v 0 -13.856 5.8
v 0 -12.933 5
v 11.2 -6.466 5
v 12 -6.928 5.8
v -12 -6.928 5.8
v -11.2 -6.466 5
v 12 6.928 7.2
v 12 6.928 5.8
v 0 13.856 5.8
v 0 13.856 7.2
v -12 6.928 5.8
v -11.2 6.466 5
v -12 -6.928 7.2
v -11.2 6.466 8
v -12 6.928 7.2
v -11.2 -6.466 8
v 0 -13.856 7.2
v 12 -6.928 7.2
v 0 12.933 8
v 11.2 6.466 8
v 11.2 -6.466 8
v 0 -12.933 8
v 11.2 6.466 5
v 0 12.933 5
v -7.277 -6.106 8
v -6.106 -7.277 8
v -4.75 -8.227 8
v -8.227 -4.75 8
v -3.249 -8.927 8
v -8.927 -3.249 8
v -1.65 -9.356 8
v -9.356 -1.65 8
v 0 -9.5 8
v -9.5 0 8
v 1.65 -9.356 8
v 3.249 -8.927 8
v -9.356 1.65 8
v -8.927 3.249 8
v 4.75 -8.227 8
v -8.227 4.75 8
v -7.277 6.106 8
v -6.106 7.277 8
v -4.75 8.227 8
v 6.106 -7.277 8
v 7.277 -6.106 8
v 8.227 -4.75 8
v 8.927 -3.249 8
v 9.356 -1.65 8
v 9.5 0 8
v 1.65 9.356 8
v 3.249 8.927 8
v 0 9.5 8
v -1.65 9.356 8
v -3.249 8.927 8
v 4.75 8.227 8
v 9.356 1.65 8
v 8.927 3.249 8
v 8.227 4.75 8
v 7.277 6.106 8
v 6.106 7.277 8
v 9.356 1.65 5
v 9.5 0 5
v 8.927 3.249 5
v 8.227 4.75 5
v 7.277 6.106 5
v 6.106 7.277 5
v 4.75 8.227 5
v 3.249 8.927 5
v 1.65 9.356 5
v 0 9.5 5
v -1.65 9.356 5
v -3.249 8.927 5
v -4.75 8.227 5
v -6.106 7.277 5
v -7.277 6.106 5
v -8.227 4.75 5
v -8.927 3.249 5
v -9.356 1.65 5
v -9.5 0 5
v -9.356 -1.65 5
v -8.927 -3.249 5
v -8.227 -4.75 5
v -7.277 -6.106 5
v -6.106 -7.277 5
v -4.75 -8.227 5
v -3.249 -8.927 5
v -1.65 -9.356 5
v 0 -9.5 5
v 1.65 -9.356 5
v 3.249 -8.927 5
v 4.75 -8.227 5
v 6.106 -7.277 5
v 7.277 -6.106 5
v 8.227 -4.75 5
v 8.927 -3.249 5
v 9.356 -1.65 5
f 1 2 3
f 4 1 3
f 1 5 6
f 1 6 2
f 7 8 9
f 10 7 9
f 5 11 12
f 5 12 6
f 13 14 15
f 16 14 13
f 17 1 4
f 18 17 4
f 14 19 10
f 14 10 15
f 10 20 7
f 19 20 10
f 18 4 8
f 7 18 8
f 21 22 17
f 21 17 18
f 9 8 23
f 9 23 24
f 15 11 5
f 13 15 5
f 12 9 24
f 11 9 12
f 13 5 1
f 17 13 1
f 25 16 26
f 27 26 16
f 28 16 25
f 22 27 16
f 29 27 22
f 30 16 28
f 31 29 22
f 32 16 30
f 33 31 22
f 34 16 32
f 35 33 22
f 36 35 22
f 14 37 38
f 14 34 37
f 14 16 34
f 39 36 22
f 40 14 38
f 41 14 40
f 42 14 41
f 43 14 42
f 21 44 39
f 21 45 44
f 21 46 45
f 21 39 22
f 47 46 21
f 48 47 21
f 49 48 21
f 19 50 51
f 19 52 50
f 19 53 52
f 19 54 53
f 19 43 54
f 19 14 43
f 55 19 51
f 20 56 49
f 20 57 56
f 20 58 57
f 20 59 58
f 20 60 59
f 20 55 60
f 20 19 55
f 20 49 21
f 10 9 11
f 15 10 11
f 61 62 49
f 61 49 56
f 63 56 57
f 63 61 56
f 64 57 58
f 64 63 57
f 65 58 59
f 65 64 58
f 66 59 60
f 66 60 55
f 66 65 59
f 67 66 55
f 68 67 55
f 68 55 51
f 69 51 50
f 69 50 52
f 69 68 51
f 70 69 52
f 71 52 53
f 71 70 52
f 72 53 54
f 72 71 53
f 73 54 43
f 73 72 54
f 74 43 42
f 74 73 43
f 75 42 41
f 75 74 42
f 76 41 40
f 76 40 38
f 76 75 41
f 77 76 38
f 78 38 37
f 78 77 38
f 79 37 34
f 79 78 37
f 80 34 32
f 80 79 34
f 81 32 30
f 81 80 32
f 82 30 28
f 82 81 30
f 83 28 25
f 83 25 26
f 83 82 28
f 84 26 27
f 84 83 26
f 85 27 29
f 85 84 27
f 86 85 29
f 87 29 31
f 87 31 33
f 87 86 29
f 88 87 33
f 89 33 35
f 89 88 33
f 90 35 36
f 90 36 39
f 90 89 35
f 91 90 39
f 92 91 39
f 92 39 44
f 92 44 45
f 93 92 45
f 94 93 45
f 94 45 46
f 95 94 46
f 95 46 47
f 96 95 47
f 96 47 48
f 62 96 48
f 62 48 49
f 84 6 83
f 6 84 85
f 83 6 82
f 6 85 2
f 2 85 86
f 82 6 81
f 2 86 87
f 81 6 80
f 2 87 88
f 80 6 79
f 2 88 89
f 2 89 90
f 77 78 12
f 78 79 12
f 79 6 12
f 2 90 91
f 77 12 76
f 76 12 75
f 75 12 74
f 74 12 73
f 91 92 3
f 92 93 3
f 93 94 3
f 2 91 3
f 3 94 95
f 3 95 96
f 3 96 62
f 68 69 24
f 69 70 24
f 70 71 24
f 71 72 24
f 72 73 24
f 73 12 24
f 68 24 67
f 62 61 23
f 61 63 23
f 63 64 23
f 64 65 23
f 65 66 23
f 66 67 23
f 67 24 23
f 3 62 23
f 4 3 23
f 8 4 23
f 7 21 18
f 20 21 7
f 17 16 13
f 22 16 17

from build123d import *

# Parameters (mm, degrees)
SKETCH019_R     = 9.5
PAD009_DEPTH    = 3
CHAMFER005_SIZE = 0.8
CHAMFER004_SIZE = 0.8


with BuildPart() as part:
    # Sketch019 → Pad009 (new body)
    with BuildSketch(Plane.XY):
        Polygon((12, -6.928203), (12, 6.928203), (0, 13.856406), (-12, 6.928203), (-12, -6.928203), (0, -13.856406), align=None)
        Circle(SKETCH019_R, mode=Mode.SUBTRACT)
    extrude(amount=PAD009_DEPTH)

    # Chamfer005
    chamfer005_edges = [part.edges().sort_by_distance(p)[0] for p in [
        (12, 0, 3),
        (6, -10.392305, 3),
        (-6, -10.392305, 3),
        (-12, 0, 3),
        (-6, 10.392305, 3),
        (6, 10.392305, 3),
    ]]
    chamfer(chamfer005_edges, length=CHAMFER005_SIZE)

    # Chamfer004
    chamfer004_edges = [part.edges().sort_by_distance(p)[0] for p in [
        (-6, 10.392305, 0),
        (-12, 0, 0),
        (-6, -10.392305, 0),
        (6, -10.392305, 0),
        (12, 0, 0),
        (6, 10.392305, 0),
    ]]
    chamfer(chamfer004_edges, length=CHAMFER004_SIZE)


with BuildPart() as part_1:
    # Body006 placement: moved
    add(part.part.moved(Location((0, 0, 5))))


solid = part_1.part
